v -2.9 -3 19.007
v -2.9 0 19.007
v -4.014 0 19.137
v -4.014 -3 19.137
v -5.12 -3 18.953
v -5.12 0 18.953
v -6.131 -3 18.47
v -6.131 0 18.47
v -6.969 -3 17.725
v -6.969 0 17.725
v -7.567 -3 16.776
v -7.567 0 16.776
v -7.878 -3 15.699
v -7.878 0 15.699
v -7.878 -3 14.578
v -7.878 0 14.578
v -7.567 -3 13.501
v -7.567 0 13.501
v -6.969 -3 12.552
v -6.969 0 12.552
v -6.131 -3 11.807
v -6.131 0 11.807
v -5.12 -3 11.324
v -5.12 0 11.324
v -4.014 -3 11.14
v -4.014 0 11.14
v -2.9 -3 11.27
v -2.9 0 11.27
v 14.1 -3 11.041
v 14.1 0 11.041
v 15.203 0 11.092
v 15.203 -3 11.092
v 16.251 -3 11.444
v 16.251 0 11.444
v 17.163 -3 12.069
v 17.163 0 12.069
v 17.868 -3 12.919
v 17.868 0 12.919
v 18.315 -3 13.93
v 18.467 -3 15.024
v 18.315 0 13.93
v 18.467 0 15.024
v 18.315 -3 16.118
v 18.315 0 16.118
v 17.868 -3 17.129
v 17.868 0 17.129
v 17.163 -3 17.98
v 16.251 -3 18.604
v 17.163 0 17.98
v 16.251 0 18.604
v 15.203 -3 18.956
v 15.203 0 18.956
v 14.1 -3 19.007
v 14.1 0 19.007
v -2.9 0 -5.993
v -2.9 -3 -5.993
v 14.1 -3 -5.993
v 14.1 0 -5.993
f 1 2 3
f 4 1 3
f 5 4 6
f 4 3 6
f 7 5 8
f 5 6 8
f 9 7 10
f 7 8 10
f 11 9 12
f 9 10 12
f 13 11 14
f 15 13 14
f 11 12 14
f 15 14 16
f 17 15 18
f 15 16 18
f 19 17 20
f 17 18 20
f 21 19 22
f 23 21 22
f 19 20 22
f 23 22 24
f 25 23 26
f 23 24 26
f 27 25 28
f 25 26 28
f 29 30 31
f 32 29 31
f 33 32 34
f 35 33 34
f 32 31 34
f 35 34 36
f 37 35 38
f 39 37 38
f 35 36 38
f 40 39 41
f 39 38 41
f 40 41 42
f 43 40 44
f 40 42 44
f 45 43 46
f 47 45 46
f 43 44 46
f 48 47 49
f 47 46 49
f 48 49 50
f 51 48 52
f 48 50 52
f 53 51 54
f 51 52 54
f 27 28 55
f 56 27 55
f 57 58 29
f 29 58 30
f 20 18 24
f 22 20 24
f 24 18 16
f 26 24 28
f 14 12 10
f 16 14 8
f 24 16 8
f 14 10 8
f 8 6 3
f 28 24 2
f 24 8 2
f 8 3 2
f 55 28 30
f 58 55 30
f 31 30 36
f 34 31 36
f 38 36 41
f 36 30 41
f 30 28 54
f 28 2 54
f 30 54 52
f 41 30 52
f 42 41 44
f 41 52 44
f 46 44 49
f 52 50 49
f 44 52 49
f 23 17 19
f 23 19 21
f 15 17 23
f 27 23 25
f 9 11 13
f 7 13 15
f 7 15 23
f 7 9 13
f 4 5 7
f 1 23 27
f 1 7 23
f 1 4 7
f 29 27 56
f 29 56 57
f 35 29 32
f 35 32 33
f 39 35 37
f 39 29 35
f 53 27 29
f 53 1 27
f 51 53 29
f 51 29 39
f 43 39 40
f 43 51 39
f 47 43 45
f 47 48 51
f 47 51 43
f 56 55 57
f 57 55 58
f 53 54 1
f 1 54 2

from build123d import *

# Parameters (mm, degrees)
F1_DEPTH = 3


with BuildPart() as f1:
    # F0 (on Front) → F1 (new body)
    with BuildSketch(Plane.XZ):
        with BuildLine():
            ThreePointArc((-2.900381, 19.007138), (-7.917083, 15.138505), (-2.900381, 11.269873))
            Line((-2.900381, 11.269873), (-2.900381, -5.992862))
            Line((-2.900381, -5.992862), (14.099619, -5.992862))
            Line((14.099619, -5.992862), (14.099619, 11.040998))
            ThreePointArc((14.099619, 11.040998), (18.467255, 15.024068), (14.099619, 19.007138))
            Line((14.099619, 19.007138), (-2.900381, 19.007138))
        make_face()
    extrude(amount=F1_DEPTH)


solid = f1.part
